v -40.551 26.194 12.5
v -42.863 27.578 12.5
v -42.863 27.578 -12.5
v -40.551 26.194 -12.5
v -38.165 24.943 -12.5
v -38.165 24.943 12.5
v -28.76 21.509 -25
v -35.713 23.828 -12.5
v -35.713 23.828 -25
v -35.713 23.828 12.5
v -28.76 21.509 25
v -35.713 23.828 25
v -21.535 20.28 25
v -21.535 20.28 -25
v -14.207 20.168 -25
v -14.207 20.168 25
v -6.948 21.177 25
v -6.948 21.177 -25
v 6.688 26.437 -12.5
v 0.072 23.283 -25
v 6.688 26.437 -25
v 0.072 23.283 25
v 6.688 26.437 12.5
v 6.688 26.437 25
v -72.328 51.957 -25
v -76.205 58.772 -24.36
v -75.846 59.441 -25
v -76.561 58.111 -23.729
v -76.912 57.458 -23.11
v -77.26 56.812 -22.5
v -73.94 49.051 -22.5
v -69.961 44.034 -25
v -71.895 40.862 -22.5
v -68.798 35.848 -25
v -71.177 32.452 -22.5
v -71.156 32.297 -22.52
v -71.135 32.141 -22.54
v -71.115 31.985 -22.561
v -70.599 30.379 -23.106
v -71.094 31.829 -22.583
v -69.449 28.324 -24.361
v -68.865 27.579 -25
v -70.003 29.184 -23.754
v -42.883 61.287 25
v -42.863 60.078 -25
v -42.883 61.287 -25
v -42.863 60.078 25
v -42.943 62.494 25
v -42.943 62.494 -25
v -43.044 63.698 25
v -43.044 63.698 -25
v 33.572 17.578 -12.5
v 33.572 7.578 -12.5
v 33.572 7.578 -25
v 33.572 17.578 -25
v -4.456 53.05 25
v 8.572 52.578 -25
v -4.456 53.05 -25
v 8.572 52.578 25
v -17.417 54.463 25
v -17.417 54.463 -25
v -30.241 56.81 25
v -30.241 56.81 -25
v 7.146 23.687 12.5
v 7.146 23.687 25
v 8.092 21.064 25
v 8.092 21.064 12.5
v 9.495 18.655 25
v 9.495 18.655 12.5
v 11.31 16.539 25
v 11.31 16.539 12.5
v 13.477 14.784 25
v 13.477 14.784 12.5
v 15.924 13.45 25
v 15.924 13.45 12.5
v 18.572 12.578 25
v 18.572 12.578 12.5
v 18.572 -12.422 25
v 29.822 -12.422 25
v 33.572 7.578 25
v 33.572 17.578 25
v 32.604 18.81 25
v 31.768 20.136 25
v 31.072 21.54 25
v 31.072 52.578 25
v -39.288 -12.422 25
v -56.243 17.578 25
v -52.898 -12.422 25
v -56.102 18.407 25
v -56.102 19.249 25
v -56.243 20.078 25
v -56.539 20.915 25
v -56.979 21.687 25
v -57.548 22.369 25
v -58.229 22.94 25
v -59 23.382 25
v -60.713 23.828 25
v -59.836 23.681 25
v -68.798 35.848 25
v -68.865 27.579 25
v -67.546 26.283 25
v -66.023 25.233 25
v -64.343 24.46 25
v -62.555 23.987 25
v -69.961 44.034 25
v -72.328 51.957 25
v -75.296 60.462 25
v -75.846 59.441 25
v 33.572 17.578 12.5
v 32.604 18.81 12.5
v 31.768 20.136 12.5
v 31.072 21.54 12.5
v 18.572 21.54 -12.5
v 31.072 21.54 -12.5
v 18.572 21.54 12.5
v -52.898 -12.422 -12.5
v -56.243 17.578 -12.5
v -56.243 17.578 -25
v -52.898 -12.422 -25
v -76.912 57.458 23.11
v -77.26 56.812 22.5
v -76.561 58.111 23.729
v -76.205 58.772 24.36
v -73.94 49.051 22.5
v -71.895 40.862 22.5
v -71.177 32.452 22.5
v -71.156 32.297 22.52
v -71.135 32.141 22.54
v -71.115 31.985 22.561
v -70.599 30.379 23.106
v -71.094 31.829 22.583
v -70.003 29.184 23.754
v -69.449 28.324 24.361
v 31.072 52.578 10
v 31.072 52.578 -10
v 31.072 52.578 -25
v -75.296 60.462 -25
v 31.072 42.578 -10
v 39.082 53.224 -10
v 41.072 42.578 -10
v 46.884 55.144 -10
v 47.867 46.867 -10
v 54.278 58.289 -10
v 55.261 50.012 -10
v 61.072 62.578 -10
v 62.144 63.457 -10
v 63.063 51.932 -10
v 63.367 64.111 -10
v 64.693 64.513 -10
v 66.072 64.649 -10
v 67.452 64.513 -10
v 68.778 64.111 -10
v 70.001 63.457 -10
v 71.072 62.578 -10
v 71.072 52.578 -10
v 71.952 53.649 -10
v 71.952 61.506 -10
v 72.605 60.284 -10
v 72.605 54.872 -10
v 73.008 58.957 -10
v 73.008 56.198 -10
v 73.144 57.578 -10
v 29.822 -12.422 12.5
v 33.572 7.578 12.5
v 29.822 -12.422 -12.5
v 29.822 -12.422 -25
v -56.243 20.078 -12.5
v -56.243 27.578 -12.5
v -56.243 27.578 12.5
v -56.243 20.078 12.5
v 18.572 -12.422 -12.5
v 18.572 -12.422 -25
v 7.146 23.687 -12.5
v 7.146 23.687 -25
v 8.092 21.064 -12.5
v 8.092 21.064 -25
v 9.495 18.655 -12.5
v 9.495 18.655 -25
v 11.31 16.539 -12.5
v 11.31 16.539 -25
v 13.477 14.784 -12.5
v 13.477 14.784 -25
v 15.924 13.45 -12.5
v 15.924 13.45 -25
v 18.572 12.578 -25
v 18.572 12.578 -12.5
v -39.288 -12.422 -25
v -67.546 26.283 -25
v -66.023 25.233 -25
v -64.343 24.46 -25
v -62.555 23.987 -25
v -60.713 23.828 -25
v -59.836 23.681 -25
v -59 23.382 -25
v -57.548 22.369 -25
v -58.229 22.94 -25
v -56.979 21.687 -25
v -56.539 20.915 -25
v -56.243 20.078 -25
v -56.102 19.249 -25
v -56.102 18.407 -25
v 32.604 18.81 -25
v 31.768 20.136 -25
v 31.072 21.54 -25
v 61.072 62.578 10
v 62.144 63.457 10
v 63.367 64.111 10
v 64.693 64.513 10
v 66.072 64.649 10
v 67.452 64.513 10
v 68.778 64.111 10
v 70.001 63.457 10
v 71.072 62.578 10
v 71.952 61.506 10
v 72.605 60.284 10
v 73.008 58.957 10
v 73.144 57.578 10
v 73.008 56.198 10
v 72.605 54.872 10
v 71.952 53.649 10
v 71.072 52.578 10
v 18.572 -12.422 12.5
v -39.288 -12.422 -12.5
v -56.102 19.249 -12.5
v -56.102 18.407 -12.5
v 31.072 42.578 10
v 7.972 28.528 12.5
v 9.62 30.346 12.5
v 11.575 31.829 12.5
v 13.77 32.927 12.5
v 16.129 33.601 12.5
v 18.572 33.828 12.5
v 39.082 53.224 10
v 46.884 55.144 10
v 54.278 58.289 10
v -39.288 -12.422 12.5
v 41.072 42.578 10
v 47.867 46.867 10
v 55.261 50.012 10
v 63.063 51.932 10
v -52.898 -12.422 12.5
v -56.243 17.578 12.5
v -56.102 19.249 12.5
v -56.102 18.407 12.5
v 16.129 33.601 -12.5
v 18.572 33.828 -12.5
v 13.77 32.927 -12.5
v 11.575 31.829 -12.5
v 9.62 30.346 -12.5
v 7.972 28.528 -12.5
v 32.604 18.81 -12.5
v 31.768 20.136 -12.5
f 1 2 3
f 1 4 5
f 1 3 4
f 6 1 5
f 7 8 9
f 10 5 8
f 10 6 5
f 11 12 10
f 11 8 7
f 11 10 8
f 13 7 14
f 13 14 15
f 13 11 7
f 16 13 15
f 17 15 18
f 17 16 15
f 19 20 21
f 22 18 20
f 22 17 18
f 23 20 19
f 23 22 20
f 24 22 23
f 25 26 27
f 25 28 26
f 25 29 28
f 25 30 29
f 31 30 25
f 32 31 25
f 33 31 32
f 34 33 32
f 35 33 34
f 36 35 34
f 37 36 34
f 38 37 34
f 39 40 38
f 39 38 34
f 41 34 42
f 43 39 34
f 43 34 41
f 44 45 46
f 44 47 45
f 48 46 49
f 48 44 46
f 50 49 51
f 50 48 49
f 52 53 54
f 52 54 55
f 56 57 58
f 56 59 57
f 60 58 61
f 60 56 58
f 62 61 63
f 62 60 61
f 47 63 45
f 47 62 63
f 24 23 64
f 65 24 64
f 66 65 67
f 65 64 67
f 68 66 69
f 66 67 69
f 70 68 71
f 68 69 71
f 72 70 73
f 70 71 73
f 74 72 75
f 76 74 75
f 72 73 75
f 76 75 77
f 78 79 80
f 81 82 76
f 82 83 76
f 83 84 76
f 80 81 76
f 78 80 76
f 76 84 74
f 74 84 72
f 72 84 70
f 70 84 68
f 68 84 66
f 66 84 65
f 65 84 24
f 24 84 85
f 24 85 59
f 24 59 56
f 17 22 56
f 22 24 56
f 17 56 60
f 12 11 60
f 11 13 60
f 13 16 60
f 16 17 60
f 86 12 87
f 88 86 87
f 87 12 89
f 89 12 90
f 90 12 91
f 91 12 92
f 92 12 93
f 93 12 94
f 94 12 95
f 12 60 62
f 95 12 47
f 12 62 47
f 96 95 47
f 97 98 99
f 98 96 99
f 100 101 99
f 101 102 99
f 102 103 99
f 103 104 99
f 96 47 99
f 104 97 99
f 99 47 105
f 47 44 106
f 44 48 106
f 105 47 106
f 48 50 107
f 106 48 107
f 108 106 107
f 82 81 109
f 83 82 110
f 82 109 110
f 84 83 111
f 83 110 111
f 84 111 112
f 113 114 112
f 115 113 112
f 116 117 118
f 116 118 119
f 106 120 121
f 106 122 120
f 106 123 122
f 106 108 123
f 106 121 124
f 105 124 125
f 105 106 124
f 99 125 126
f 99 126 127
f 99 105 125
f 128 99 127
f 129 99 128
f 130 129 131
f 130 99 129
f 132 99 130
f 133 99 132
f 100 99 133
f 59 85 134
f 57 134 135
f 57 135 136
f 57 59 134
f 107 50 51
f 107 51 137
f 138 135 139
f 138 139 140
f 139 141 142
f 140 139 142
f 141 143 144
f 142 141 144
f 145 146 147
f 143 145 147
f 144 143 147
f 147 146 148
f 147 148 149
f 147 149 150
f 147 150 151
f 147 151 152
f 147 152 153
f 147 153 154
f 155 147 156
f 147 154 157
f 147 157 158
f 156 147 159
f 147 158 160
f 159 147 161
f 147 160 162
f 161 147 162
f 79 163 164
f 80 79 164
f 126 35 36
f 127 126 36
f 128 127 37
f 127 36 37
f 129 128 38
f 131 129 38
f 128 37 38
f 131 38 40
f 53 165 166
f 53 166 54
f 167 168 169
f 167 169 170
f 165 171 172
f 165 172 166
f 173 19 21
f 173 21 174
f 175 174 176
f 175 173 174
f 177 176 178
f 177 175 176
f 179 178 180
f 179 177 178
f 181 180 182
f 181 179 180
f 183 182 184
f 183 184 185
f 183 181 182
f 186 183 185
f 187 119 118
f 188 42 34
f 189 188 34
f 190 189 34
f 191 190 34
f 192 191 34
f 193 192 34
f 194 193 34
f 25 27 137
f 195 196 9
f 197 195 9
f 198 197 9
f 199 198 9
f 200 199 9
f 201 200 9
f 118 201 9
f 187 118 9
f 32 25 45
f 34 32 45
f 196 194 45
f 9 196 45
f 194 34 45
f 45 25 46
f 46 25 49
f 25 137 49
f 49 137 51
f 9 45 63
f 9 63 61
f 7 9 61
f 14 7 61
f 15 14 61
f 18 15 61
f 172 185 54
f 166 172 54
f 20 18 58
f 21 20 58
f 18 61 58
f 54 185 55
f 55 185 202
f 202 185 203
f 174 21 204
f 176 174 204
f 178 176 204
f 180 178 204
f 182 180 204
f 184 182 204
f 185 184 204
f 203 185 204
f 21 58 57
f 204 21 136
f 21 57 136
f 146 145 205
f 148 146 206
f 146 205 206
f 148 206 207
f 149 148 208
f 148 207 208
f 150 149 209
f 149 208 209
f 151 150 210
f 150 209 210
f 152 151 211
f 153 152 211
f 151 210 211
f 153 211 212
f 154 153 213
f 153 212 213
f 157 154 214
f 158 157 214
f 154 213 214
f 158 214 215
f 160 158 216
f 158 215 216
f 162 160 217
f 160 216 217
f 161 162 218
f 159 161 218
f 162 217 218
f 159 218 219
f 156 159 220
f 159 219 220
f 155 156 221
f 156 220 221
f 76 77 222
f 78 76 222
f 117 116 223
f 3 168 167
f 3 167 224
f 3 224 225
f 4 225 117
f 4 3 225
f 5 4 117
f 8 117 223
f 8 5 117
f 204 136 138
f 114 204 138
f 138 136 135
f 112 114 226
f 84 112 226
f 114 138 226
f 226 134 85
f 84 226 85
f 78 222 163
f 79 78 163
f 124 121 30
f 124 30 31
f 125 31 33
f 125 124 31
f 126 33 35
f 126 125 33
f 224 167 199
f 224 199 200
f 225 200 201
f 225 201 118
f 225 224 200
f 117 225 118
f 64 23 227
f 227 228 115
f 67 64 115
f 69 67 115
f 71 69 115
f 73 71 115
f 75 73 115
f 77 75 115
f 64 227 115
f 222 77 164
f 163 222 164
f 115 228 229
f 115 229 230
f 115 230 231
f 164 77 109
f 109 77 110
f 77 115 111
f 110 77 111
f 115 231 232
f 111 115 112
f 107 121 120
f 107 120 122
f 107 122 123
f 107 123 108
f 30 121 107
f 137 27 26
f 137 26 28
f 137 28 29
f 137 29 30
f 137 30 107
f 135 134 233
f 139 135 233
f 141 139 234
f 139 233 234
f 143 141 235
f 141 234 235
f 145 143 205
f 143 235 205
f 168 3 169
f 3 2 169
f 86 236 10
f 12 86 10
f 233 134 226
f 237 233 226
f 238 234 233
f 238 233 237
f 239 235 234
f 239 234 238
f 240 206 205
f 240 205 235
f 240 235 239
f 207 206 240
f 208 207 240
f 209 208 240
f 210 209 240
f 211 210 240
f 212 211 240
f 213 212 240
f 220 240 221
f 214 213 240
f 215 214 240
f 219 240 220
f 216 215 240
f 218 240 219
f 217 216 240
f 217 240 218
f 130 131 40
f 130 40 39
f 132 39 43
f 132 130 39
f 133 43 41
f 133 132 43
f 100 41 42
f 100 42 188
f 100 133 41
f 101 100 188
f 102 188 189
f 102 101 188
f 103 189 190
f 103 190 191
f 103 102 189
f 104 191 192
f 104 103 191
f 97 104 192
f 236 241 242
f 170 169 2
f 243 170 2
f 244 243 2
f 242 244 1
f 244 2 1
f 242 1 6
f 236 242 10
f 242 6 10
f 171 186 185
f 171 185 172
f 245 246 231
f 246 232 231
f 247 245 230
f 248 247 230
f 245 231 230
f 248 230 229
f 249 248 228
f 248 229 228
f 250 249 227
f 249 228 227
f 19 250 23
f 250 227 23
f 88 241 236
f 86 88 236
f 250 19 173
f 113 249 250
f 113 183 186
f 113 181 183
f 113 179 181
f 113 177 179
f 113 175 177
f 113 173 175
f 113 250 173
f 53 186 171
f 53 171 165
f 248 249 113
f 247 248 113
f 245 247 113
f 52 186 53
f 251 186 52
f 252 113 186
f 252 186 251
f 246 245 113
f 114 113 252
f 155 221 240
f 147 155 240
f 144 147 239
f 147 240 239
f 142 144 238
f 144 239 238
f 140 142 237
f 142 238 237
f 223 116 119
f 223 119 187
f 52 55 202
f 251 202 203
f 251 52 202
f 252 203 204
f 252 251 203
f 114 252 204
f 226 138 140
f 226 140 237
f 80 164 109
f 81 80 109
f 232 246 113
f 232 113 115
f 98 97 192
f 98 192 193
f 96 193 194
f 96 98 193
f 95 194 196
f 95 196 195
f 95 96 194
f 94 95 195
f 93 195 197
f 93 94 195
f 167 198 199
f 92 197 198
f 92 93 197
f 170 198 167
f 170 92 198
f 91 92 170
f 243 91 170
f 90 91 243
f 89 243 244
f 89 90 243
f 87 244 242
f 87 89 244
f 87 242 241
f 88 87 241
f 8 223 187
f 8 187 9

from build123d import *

# Parameters (mm, degrees)
F1_DEPTH     = 25
F2_DEPTH     = 12.5
F4_DEPTH     = 12.5
F5_DEPTH     = 16.25
F7_DEPTH     = 24.3842223705
F6_W         = 10
F6_H         = 10
F8_DEPTH     = 40
F10_DEPTH    = 20
F11_W        = 7.0710678119
F11_H        = 20
F12_ANGLE    = 180
F13_W        = 25
F13_H        = 50
F13_W_2      = 11.2650044263
F14_ANGLE    = 5.7295779513
F15_T1_DEPTH = 52.2024679969
F15_T3_DEPTH = 69.535784442
F15_T6_ANGLE = 45.7032352823
F15_T8_ANGLE = 45.7032352823


# Not quite as in the source:
# - a fillet or chamfer that OpenCascade refuses, or shapes differently, is made with other operations: its cross-section is extruded or revolved along the edge and cut away or added
# - a pattern or mirror of a feature is missing from the dataset's text; its kind, count and spacing are read off the source's solid


with BuildPart() as f1:
    # F0 (on Top) → F1 (new body)
    with BuildSketch(Plane.XY):
        with BuildLine():
            ThreePointArc((8.5724992678, 52.5779476486), (-17.4169661561, 54.4628096646), (-42.8625009954, 60.0779476486))
            Line((-42.8625009954, 60.0779476486), (-79.1275054216, 60.0779476486))
            ThreePointArc((-79.1275054216, 60.0779476486), (-73.2024272044, 46.6744306132), (-71.1757168174, 32.1605315572))
            ThreePointArc((-71.1757168174, 32.1605315572), (-67.4004664777, 26.1656086442), (-60.7126449392, 23.8279476486))
            ThreePointArc((-60.7126449392, 23.8279476486), (-57.8761392565, 22.6699366601), (-56.2426317111, 20.0779476486))
            Line((-56.2426317111, 20.0779476486), (-56.2426317111, 27.5779476486))
            Line((-56.2426317111, 27.5779476486), (-42.8625009954, 27.5779476486))
            ThreePointArc((-42.8625009954, 27.5779476486), (-39.3668172692, 25.5518582213), (-35.7126449392, 23.8279476486))
            ThreePointArc((-35.7126449392, 23.8279476486), (-14.2067307678, 20.1682602333), (6.6882768972, 26.4369372072))
            ThreePointArc((6.6882768972, 26.4369372072), (11.5749679763, 31.8294833583), (18.5724992678, 33.8279476486))
            Line((18.5724992678, 33.8279476486), (18.5724992678, 40.0779476486))
            Line((18.5724992678, 40.0779476486), (18.5724992678, 52.5779476486))
            Line((18.5724992678, 52.5779476486), (8.5724992678, 52.5779476486))
        make_face()
        with BuildLine():
            Line((-56.2426317111, 27.5779476486), (-56.2426317111, 20.0779476486))
            ThreePointArc((-56.2426317111, 20.0779476486), (-56.084348871, 18.8279476486), (-56.2426317111, 17.5779476486))
            Line((-56.2426317111, 17.5779476486), (-52.8975990321, -12.4220523514))
            Line((-52.8975990321, -12.4220523514), (-39.2875729673, -12.4220523514))
            Line((-39.2875729673, -12.4220523514), (-35.7126449392, 23.8279476486))
            ThreePointArc((-35.7126449392, 23.8279476486), (-39.3668172692, 25.5518582213), (-42.8625009954, 27.5779476486))
            Line((-42.8625009954, 27.5779476486), (-56.2426317111, 27.5779476486))
        make_face()
        with BuildLine():
            ThreePointArc((29.8224992678, 27.5779476486), (25.0072681059, 32.1605315572), (18.5724992678, 33.8279476486))
            ThreePointArc((18.5724992678, 33.8279476486), (11.5749679763, 31.8294833583), (6.6882768972, 26.4369372072))
            ThreePointArc((6.6882768972, 26.4369372072), (10.35454594, 17.5558849939), (18.5724992678, 12.5779476486))
            Line((18.5724992678, 12.5779476486), (18.5724992678, -12.4220523514))
            Line((18.5724992678, -12.4220523514), (29.8224992678, -12.4220523514))
            Line((29.8224992678, -12.4220523514), (33.5724992678, 7.5779476486))
            Line((33.5724992678, 7.5779476486), (33.5724992678, 17.5779476486))
            ThreePointArc((33.5724992678, 17.5779476486), (30.7908263589, 22.2379453078), (29.8224992678, 27.5779476486))
        make_face()
    extrude(amount=F1_DEPTH)

    # F0 (on Top) → F2 (cut)
    with BuildSketch(Plane.XY):
        with BuildLine():
            ThreePointArc((29.8224992678, 27.5779476486), (25.0072681059, 32.1605315572), (18.5724992678, 33.8279476486))
            ThreePointArc((18.5724992678, 33.8279476486), (11.5749679763, 31.8294833583), (6.6882768972, 26.4369372072))
            ThreePointArc((6.6882768972, 26.4369372072), (10.35454594, 17.5558849939), (18.5724992678, 12.5779476486))
            Line((18.5724992678, 12.5779476486), (18.5724992678, -12.4220523514))
            Line((18.5724992678, -12.4220523514), (29.8224992678, -12.4220523514))
            Line((29.8224992678, -12.4220523514), (33.5724992678, 7.5779476486))
            Line((33.5724992678, 7.5779476486), (33.5724992678, 17.5779476486))
            ThreePointArc((33.5724992678, 17.5779476486), (30.7908263589, 22.2379453078), (29.8224992678, 27.5779476486))
        make_face()
        with BuildLine():
            Line((-56.2426317111, 27.5779476486), (-56.2426317111, 20.0779476486))
            ThreePointArc((-56.2426317111, 20.0779476486), (-56.084348871, 18.8279476486), (-56.2426317111, 17.5779476486))
            Line((-56.2426317111, 17.5779476486), (-52.8975990321, -12.4220523514))
            Line((-52.8975990321, -12.4220523514), (-39.2875729673, -12.4220523514))
            Line((-39.2875729673, -12.4220523514), (-35.7126449392, 23.8279476486))
            ThreePointArc((-35.7126449392, 23.8279476486), (-39.3668172692, 25.5518582213), (-42.8625009954, 27.5779476486))
            Line((-42.8625009954, 27.5779476486), (-56.2426317111, 27.5779476486))
        make_face()
    extrude(amount=F2_DEPTH, mode=Mode.SUBTRACT)

    # F3: F1 across plane


with BuildPart() as f1_1:
    add(f1.part)
    add(f1.part.mirror(Plane.XY))

    # F4 (add): a face of the model
    f4_faces = [f1_1.faces().sort_by_distance(p)[0] for p in [
        (18.5724992678, 43.2029476486, 0),
    ]]
    extrude(f4_faces, amount=F4_DEPTH)

    # F5 (add, through all): a face of the model
    f5_faces = [f1_1.faces().sort_by_distance(p)[0] for p in [
        (24.8224992678, 33.8279476486, 0),
    ]]
    extrude(f5_faces, amount=F5_DEPTH)

    # F6 (on face) → F7 (cut, through all)
    with BuildSketch(Plane.YZ.offset(31.0724992678)):
        Polygon((21.5398740044, 0), (21.5398740044, 12.5), (17.5779476486, 12.5), (17.5779476486, -12.5), (21.5398740044, -12.5), align=None)
    extrude(amount=-F7_DEPTH, mode=Mode.SUBTRACT)

    # F6 (on face) → F8 (join)
    with BuildSketch(Plane.YZ.offset(31.0724992678)):
        Polygon((62.5779476486, 10), (52.5779476486, 10), (52.5779476486, 0), (52.5779476486, -10), (62.5779476486, -10), align=None)
        with Locations((47.5779476486, 5)):
            Rectangle(F6_W, F6_H)
    f8 = extrude(amount=F8_DEPTH)

    # F8_copies: F8 across plane
    add(f8.mirror(Plane(origin=(0, 0, 0), x_dir=(-1, 0, 0), z_dir=(0, 0, -1))))

    # F9 (on face) → F10 (cut, through all)
    with BuildSketch(Plane.XY.offset(10)):
        with BuildLine():
            ThreePointArc((31.0724992678, 52.5779476486), (46.8838875686, 55.1437827461), (61.0724992678, 62.5779476486))
            Line((61.0724992678, 62.5779476486), (51.0724992678, 62.5779476486))
            Line((51.0724992678, 62.5779476486), (31.0724992678, 62.5779476486))
            Line((31.0724992678, 62.5779476486), (31.0724992678, 52.5779476486))
        make_face()
        Polygon((71.0724992678, 52.5779476486), (71.0724992678, 62.5779476486), (61.0724992678, 62.5779476486), align=None)
        with BuildLine():
            Line((71.0724992678, 42.5779476486), (71.0724992678, 52.5779476486))
            ThreePointArc((71.0724992678, 52.5779476486), (55.2611109669, 50.0121125511), (41.0724992678, 42.5779476486))
            Line((41.0724992678, 42.5779476486), (51.0724992678, 42.5779476486))
            Line((51.0724992678, 42.5779476486), (71.0724992678, 42.5779476486))
        make_face()
    extrude(amount=-F10_DEPTH, mode=Mode.SUBTRACT)

    # F11 (on face) → F12 (revolve)
    with BuildSketch(Plane(origin=(61.8252234582, 61.8252234582, 0), x_dir=(-0.7071067812, 0.7071067812, 0), z_dir=(0.7071067812, 0.7071067812, 0))):
        with Locations((-2.4710211471, 0)):
            Rectangle(F11_W, F11_H)
    revolve(axis=Axis((66.0724992678, 57.5779476486, 0), (0, 0, -1)), revolution_arc=F12_ANGLE)

    # F13 (on face) → F14 (revolve)
    with BuildSketch(Plane(origin=(0, 60.0779476486, 0), x_dir=(-1, 0, 0), z_dir=(0, 1, 0))):
        with Locations((55.3625009954, 0)):
            Rectangle(F13_W, F13_H)
        with Locations((73.4950032085, 0)):
            Rectangle(F13_W_2, F13_H)
    revolve(axis=Axis((-79.1275054216, 60.0779476486, 0), (0, 0, 1)), revolution_arc=F14_ANGLE)

    # F15: chamfer of 2.5 on 4 edges, made by hand

    # F15_s2 → F15_t1 (cut)
    with BuildSketch(Plane.XY.offset(-26.1012339984)):
        with BuildLine():
            Line((-71.1765205144, 32.4523590493), (-71.0941336441, 31.829473599))
            ThreePointArc((-71.0941336441, 31.829473599), (-71.1242415299, 31.9464717064), (-71.1757168174, 32.1605315572))
            ThreePointArc((-71.1757168174, 32.1605315572), (-71.1760775289, 32.3560379433), (-71.1765205144, 32.4523590493))
        make_face()
    extrude(amount=F15_T1_DEPTH, mode=Mode.SUBTRACT)

    # F15_s4 → F15_t3 (cut)
    with BuildSketch(Plane.XY.offset(-34.767892221)):
        with BuildLine():
            Line((-77.2597253727, 56.8116607658), (-75.2963846316, 60.4623418968))
            Line((-75.2963846316, 60.4623418968), (-79.1275054216, 60.0779476486))
            ThreePointArc((-79.1275054216, 60.0779476486), (-78.1514580859, 58.4383743549), (-77.2597253727, 56.8116607658))
        make_face()
    extrude(amount=F15_T3_DEPTH, mode=Mode.SUBTRACT)

    # F15_s5 → F15_t6 (revolve, cut)
    with BuildSketch(Plane(origin=(-64.3425340859, 80.1682893814, 0), x_dir=(0, 0, 1), z_dir=(-0.6259274923, 0.7798812566, 0))):
        Polygon((22.5, -23.7159805894), (25, -21.2159805894), (25, -23.7159805894), align=None)
    revolve(axis=Axis((-124.1583289793, 32.1605315572, 25), (0, 0, -1)), revolution_arc=F15_T6_ANGLE, mode=Mode.SUBTRACT)

    # F15_s7 → F15_t8 (revolve, cut)
    with BuildSketch(Plane(origin=(-64.3425340859, 80.1682893814, 0), x_dir=(0, 0, 1), z_dir=(-0.6259274923, 0.7798812566, 0))):
        Polygon((-25, -21.2159805894), (-22.5, -23.7159805894), (-25, -23.7159805894), align=None)
    revolve(axis=Axis((-124.1583289793, 32.1605315572, -25), (0, 0, -1)), revolution_arc=F15_T8_ANGLE, mode=Mode.SUBTRACT)


solid = f1_1.part
